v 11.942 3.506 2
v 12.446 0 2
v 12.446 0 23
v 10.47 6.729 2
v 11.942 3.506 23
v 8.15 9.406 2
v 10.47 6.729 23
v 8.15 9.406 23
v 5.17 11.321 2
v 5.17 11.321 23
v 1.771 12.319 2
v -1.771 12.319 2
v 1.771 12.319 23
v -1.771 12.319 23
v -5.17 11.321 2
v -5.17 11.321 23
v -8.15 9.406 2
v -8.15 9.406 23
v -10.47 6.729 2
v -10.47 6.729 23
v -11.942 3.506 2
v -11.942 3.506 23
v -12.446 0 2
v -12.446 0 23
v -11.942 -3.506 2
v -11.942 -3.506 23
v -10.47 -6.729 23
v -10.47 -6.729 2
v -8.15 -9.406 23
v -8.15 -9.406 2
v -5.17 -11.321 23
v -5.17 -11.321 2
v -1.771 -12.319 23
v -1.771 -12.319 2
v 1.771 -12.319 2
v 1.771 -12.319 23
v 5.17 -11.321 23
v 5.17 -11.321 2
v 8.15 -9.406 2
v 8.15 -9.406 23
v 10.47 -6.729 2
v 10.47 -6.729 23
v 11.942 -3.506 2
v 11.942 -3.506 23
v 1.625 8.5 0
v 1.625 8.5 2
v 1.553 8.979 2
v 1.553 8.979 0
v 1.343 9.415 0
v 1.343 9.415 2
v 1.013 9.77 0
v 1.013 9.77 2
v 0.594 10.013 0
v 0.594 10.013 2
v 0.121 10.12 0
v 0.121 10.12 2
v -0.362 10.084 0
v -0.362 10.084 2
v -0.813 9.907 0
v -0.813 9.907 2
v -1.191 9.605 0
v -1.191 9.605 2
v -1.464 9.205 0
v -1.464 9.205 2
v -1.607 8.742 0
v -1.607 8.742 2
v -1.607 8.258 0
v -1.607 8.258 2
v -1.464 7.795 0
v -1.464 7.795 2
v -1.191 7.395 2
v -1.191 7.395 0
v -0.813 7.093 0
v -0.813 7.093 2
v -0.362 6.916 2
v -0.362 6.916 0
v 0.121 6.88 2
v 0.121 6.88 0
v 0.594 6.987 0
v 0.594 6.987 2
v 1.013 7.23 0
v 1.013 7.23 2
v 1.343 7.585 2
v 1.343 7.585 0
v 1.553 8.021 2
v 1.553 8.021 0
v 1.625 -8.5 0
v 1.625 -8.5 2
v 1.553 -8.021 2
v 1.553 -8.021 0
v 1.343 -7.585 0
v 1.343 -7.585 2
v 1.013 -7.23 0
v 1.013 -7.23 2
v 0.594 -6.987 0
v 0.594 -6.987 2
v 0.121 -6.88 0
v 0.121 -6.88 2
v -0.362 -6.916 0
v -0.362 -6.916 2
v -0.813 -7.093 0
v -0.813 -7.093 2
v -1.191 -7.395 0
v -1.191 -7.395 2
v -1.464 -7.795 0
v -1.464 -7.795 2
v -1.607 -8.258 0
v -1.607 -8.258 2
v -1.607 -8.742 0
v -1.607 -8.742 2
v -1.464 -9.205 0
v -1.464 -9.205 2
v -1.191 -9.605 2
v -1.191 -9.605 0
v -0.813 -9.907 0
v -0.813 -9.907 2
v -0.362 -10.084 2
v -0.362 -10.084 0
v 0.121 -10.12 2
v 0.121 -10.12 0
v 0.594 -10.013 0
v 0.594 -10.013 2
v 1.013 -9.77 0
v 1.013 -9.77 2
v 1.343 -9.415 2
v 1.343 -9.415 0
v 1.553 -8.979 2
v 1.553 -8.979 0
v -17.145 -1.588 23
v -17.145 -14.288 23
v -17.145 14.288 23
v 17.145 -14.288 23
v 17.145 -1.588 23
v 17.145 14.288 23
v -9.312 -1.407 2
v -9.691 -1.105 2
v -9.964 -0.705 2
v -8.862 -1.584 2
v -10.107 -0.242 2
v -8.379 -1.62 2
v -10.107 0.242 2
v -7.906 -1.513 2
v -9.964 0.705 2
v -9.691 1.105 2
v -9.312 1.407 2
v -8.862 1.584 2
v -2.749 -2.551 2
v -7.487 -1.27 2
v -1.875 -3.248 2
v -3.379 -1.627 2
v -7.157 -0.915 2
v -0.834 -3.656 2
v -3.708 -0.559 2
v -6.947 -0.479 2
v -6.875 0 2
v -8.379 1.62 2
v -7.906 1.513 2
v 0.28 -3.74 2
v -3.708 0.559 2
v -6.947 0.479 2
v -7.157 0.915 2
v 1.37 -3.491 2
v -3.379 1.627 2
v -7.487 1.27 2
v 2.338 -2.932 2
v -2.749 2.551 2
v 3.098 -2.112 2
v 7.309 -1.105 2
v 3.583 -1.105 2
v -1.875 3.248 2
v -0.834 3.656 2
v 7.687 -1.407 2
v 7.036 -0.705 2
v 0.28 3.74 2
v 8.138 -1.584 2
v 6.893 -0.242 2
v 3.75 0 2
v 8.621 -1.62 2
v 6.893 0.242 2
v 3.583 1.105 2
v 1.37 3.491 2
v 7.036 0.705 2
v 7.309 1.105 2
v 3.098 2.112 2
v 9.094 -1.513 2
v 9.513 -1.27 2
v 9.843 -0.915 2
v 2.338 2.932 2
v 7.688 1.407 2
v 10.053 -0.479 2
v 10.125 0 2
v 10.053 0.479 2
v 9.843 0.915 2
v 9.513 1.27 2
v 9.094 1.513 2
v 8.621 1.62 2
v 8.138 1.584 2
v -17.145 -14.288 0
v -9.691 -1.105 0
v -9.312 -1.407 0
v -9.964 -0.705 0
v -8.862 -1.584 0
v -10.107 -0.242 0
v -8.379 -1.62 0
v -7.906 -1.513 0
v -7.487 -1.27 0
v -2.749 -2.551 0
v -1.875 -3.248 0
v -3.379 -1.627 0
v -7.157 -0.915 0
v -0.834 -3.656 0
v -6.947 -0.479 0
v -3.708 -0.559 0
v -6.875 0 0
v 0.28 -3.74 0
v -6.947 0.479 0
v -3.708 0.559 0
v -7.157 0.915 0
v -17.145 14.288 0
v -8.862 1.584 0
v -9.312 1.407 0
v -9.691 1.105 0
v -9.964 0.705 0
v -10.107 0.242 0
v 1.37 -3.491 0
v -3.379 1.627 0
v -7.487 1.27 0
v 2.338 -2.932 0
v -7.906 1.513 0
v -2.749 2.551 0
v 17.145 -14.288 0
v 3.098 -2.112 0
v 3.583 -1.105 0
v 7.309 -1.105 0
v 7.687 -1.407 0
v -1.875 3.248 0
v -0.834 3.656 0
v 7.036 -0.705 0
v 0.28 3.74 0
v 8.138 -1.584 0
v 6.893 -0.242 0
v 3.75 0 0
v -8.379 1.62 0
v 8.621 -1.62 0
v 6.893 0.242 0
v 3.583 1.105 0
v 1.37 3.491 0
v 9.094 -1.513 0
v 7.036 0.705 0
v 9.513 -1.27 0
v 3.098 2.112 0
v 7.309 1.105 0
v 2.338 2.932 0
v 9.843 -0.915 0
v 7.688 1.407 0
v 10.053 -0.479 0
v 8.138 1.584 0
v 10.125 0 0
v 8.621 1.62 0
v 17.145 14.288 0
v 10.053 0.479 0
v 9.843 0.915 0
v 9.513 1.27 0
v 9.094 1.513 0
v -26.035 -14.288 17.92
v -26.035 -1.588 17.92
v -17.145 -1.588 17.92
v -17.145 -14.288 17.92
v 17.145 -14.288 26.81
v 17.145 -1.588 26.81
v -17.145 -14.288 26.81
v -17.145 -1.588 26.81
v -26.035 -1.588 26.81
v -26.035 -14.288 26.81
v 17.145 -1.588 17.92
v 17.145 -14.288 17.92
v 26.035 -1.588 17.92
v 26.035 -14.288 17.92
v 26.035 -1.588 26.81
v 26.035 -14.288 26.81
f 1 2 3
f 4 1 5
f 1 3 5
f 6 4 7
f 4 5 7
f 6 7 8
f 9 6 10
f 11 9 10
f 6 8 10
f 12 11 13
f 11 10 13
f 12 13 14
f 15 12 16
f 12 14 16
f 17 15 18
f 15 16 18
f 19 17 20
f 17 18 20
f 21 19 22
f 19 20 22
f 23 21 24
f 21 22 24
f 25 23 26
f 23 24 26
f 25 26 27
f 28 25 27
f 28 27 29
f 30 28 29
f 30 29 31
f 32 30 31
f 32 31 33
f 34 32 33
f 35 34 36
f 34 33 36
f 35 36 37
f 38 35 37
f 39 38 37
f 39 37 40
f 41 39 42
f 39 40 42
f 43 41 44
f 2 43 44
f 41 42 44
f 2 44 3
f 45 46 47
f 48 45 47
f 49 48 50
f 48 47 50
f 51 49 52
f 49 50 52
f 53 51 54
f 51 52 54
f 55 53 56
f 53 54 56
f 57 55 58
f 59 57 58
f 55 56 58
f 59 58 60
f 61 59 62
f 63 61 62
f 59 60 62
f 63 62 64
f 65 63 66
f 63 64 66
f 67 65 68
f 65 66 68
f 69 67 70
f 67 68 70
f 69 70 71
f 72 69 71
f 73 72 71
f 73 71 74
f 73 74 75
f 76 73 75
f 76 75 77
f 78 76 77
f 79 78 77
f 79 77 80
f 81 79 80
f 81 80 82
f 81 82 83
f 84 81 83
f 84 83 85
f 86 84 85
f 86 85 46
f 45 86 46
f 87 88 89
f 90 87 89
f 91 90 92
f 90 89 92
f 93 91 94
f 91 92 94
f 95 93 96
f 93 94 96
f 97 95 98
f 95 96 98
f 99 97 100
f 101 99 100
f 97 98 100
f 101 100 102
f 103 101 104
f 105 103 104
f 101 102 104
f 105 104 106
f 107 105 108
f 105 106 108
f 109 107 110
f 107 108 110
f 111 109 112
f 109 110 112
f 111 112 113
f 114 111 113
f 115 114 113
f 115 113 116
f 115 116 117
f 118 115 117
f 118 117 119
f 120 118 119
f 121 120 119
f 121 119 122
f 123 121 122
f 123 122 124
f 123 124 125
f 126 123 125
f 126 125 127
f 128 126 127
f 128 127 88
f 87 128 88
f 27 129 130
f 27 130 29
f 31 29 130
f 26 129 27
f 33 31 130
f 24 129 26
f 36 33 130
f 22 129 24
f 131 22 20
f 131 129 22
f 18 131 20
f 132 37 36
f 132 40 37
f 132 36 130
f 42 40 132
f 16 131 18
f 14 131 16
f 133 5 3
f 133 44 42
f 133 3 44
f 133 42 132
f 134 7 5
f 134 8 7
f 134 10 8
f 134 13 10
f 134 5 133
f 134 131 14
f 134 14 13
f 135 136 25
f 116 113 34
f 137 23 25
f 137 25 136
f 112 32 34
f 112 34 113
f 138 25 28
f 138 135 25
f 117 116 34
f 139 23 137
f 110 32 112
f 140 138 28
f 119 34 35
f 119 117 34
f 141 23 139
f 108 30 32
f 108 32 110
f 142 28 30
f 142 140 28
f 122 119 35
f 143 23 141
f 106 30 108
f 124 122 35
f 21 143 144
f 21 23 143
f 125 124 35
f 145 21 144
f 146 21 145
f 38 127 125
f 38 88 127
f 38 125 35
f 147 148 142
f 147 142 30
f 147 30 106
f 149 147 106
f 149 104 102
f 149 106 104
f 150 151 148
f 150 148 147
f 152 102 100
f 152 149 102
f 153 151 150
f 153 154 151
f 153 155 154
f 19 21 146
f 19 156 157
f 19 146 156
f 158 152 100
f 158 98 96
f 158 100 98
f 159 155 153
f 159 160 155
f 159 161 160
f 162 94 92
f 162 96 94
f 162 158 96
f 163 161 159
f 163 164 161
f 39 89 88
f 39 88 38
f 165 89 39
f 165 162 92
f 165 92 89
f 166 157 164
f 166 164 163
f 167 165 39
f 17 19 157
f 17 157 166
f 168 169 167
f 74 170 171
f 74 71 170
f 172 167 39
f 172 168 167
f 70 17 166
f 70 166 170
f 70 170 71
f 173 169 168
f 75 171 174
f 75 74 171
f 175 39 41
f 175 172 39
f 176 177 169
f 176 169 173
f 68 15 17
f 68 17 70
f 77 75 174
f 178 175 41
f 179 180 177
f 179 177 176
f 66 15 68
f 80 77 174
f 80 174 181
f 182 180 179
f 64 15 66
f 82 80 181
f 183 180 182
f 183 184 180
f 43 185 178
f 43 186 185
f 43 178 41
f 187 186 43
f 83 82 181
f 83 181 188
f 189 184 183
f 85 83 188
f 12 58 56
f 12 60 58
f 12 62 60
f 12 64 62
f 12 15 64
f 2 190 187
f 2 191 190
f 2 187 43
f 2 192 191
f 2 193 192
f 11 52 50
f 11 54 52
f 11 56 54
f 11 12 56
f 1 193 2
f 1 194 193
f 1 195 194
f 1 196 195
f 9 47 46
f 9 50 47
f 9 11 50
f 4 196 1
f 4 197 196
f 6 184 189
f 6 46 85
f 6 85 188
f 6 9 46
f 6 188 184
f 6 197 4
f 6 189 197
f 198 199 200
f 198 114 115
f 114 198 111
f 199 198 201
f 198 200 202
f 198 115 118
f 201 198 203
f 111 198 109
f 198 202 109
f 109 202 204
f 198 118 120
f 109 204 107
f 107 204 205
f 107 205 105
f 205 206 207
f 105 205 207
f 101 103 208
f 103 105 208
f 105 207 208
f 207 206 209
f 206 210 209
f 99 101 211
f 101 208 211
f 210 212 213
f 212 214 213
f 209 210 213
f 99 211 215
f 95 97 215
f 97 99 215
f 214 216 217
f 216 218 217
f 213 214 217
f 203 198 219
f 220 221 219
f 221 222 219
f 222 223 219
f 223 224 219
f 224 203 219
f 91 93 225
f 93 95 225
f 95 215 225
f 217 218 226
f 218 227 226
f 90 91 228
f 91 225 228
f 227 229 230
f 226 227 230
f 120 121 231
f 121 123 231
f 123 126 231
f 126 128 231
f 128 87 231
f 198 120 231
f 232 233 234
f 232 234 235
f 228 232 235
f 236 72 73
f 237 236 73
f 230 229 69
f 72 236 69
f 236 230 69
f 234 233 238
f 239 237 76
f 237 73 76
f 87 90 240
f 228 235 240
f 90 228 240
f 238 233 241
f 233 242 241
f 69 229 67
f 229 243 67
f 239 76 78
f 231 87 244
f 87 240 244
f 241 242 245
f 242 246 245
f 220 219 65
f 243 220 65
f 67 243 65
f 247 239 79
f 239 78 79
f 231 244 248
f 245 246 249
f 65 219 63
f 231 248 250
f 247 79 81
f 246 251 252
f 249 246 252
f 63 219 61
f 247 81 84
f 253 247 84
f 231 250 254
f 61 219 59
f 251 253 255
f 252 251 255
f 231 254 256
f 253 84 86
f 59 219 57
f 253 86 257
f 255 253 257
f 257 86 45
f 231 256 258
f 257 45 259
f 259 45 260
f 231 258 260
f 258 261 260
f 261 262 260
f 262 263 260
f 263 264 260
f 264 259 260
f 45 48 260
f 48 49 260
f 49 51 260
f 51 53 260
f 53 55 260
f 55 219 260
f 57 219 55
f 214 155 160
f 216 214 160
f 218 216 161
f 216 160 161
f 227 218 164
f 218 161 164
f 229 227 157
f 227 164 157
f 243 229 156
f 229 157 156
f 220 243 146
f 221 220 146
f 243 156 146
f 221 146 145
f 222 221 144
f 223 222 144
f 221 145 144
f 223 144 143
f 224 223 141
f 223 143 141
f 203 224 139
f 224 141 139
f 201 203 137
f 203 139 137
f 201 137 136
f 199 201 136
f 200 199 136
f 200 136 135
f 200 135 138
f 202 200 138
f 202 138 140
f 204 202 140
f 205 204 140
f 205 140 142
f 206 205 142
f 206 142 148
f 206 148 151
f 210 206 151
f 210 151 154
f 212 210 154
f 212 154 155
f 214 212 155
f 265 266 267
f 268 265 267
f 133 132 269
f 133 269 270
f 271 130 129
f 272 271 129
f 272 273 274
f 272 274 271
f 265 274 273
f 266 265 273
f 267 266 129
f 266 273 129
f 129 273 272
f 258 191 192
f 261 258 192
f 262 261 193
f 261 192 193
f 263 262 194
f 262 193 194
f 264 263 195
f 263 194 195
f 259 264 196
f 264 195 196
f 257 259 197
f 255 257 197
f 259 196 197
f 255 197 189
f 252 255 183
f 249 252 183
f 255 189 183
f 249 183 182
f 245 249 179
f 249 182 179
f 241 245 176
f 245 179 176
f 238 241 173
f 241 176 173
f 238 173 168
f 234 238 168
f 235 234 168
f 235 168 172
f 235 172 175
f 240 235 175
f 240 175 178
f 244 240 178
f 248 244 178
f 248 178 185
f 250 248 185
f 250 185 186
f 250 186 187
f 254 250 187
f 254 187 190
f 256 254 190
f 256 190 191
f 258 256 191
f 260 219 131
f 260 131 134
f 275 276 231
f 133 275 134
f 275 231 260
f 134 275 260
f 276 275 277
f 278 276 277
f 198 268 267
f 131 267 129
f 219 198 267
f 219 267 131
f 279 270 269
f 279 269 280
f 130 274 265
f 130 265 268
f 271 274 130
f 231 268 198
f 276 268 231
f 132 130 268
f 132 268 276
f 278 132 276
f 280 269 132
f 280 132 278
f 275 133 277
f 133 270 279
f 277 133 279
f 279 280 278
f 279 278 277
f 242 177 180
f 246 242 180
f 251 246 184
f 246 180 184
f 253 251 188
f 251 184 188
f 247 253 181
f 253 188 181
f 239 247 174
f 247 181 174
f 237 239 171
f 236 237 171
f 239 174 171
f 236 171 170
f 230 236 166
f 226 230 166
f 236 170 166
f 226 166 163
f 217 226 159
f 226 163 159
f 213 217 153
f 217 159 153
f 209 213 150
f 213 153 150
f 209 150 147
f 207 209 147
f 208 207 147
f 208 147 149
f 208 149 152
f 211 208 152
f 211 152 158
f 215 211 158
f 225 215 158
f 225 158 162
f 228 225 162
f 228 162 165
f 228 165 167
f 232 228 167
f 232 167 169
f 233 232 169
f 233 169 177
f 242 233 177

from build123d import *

# Parameters (mm, degrees)
SKETCH1_W                = 34.29
SKETCH1_H                = 28.575
BOSS_EXTRUDE1_DEPTH      = 23
SKETCH3_R                = 12.446
CUT_EXTRUDE1_DEPTH       = 21
SKETCH5_R                = 1.625
SKETCH5_R_2              = 3.75
CUT_EXTRUDE2_DEPTH       = 3
SKETCH7_W                = 8.89
SKETCH7_H                = 12.7
BOSS_EXTRUDE2_DEPTH      = 3.81
BOSS_EXTRUDE2_DEPTH_BACK = 5.08


with BuildPart() as part:
    # Sketch1 → Boss-Extrude1 (new body)
    with BuildSketch(Plane.XY):
        Rectangle(SKETCH1_W, SKETCH1_H)
    extrude(amount=BOSS_EXTRUDE1_DEPTH)

    # Sketch3 → Cut-Extrude1 (cut)
    with BuildSketch(Plane.XY.offset(23)):
        Circle(SKETCH3_R)
    extrude(amount=-CUT_EXTRUDE1_DEPTH, mode=Mode.SUBTRACT)

    # Sketch5 → Cut-Extrude2 (cut, through all)
    with BuildSketch(Plane.XY.offset(2)):
        with Locations((0, 8.5)):
            Circle(SKETCH5_R)
        with Locations((-8.5, 0)):
            Circle(SKETCH5_R)
        with Locations((8.5, 0)):
            Circle(SKETCH5_R)
        with Locations((0, -8.5)):
            Circle(SKETCH5_R)
        Circle(SKETCH5_R_2)
    extrude(amount=-CUT_EXTRUDE2_DEPTH, mode=Mode.SUBTRACT)

    # Sketch7 → Boss-Extrude2 (add, two sides)
    with BuildSketch(Plane.XY.offset(23)) as boss_extrude2_sk:
        with Locations((-21.59, -7.9375)):
            Rectangle(SKETCH7_W, SKETCH7_H)
        with Locations((21.59, -7.9375)):
            Rectangle(SKETCH7_W, SKETCH7_H)
    extrude(amount=BOSS_EXTRUDE2_DEPTH)
    extrude(boss_extrude2_sk.sketch, amount=-BOSS_EXTRUDE2_DEPTH_BACK)


solid = part.part
